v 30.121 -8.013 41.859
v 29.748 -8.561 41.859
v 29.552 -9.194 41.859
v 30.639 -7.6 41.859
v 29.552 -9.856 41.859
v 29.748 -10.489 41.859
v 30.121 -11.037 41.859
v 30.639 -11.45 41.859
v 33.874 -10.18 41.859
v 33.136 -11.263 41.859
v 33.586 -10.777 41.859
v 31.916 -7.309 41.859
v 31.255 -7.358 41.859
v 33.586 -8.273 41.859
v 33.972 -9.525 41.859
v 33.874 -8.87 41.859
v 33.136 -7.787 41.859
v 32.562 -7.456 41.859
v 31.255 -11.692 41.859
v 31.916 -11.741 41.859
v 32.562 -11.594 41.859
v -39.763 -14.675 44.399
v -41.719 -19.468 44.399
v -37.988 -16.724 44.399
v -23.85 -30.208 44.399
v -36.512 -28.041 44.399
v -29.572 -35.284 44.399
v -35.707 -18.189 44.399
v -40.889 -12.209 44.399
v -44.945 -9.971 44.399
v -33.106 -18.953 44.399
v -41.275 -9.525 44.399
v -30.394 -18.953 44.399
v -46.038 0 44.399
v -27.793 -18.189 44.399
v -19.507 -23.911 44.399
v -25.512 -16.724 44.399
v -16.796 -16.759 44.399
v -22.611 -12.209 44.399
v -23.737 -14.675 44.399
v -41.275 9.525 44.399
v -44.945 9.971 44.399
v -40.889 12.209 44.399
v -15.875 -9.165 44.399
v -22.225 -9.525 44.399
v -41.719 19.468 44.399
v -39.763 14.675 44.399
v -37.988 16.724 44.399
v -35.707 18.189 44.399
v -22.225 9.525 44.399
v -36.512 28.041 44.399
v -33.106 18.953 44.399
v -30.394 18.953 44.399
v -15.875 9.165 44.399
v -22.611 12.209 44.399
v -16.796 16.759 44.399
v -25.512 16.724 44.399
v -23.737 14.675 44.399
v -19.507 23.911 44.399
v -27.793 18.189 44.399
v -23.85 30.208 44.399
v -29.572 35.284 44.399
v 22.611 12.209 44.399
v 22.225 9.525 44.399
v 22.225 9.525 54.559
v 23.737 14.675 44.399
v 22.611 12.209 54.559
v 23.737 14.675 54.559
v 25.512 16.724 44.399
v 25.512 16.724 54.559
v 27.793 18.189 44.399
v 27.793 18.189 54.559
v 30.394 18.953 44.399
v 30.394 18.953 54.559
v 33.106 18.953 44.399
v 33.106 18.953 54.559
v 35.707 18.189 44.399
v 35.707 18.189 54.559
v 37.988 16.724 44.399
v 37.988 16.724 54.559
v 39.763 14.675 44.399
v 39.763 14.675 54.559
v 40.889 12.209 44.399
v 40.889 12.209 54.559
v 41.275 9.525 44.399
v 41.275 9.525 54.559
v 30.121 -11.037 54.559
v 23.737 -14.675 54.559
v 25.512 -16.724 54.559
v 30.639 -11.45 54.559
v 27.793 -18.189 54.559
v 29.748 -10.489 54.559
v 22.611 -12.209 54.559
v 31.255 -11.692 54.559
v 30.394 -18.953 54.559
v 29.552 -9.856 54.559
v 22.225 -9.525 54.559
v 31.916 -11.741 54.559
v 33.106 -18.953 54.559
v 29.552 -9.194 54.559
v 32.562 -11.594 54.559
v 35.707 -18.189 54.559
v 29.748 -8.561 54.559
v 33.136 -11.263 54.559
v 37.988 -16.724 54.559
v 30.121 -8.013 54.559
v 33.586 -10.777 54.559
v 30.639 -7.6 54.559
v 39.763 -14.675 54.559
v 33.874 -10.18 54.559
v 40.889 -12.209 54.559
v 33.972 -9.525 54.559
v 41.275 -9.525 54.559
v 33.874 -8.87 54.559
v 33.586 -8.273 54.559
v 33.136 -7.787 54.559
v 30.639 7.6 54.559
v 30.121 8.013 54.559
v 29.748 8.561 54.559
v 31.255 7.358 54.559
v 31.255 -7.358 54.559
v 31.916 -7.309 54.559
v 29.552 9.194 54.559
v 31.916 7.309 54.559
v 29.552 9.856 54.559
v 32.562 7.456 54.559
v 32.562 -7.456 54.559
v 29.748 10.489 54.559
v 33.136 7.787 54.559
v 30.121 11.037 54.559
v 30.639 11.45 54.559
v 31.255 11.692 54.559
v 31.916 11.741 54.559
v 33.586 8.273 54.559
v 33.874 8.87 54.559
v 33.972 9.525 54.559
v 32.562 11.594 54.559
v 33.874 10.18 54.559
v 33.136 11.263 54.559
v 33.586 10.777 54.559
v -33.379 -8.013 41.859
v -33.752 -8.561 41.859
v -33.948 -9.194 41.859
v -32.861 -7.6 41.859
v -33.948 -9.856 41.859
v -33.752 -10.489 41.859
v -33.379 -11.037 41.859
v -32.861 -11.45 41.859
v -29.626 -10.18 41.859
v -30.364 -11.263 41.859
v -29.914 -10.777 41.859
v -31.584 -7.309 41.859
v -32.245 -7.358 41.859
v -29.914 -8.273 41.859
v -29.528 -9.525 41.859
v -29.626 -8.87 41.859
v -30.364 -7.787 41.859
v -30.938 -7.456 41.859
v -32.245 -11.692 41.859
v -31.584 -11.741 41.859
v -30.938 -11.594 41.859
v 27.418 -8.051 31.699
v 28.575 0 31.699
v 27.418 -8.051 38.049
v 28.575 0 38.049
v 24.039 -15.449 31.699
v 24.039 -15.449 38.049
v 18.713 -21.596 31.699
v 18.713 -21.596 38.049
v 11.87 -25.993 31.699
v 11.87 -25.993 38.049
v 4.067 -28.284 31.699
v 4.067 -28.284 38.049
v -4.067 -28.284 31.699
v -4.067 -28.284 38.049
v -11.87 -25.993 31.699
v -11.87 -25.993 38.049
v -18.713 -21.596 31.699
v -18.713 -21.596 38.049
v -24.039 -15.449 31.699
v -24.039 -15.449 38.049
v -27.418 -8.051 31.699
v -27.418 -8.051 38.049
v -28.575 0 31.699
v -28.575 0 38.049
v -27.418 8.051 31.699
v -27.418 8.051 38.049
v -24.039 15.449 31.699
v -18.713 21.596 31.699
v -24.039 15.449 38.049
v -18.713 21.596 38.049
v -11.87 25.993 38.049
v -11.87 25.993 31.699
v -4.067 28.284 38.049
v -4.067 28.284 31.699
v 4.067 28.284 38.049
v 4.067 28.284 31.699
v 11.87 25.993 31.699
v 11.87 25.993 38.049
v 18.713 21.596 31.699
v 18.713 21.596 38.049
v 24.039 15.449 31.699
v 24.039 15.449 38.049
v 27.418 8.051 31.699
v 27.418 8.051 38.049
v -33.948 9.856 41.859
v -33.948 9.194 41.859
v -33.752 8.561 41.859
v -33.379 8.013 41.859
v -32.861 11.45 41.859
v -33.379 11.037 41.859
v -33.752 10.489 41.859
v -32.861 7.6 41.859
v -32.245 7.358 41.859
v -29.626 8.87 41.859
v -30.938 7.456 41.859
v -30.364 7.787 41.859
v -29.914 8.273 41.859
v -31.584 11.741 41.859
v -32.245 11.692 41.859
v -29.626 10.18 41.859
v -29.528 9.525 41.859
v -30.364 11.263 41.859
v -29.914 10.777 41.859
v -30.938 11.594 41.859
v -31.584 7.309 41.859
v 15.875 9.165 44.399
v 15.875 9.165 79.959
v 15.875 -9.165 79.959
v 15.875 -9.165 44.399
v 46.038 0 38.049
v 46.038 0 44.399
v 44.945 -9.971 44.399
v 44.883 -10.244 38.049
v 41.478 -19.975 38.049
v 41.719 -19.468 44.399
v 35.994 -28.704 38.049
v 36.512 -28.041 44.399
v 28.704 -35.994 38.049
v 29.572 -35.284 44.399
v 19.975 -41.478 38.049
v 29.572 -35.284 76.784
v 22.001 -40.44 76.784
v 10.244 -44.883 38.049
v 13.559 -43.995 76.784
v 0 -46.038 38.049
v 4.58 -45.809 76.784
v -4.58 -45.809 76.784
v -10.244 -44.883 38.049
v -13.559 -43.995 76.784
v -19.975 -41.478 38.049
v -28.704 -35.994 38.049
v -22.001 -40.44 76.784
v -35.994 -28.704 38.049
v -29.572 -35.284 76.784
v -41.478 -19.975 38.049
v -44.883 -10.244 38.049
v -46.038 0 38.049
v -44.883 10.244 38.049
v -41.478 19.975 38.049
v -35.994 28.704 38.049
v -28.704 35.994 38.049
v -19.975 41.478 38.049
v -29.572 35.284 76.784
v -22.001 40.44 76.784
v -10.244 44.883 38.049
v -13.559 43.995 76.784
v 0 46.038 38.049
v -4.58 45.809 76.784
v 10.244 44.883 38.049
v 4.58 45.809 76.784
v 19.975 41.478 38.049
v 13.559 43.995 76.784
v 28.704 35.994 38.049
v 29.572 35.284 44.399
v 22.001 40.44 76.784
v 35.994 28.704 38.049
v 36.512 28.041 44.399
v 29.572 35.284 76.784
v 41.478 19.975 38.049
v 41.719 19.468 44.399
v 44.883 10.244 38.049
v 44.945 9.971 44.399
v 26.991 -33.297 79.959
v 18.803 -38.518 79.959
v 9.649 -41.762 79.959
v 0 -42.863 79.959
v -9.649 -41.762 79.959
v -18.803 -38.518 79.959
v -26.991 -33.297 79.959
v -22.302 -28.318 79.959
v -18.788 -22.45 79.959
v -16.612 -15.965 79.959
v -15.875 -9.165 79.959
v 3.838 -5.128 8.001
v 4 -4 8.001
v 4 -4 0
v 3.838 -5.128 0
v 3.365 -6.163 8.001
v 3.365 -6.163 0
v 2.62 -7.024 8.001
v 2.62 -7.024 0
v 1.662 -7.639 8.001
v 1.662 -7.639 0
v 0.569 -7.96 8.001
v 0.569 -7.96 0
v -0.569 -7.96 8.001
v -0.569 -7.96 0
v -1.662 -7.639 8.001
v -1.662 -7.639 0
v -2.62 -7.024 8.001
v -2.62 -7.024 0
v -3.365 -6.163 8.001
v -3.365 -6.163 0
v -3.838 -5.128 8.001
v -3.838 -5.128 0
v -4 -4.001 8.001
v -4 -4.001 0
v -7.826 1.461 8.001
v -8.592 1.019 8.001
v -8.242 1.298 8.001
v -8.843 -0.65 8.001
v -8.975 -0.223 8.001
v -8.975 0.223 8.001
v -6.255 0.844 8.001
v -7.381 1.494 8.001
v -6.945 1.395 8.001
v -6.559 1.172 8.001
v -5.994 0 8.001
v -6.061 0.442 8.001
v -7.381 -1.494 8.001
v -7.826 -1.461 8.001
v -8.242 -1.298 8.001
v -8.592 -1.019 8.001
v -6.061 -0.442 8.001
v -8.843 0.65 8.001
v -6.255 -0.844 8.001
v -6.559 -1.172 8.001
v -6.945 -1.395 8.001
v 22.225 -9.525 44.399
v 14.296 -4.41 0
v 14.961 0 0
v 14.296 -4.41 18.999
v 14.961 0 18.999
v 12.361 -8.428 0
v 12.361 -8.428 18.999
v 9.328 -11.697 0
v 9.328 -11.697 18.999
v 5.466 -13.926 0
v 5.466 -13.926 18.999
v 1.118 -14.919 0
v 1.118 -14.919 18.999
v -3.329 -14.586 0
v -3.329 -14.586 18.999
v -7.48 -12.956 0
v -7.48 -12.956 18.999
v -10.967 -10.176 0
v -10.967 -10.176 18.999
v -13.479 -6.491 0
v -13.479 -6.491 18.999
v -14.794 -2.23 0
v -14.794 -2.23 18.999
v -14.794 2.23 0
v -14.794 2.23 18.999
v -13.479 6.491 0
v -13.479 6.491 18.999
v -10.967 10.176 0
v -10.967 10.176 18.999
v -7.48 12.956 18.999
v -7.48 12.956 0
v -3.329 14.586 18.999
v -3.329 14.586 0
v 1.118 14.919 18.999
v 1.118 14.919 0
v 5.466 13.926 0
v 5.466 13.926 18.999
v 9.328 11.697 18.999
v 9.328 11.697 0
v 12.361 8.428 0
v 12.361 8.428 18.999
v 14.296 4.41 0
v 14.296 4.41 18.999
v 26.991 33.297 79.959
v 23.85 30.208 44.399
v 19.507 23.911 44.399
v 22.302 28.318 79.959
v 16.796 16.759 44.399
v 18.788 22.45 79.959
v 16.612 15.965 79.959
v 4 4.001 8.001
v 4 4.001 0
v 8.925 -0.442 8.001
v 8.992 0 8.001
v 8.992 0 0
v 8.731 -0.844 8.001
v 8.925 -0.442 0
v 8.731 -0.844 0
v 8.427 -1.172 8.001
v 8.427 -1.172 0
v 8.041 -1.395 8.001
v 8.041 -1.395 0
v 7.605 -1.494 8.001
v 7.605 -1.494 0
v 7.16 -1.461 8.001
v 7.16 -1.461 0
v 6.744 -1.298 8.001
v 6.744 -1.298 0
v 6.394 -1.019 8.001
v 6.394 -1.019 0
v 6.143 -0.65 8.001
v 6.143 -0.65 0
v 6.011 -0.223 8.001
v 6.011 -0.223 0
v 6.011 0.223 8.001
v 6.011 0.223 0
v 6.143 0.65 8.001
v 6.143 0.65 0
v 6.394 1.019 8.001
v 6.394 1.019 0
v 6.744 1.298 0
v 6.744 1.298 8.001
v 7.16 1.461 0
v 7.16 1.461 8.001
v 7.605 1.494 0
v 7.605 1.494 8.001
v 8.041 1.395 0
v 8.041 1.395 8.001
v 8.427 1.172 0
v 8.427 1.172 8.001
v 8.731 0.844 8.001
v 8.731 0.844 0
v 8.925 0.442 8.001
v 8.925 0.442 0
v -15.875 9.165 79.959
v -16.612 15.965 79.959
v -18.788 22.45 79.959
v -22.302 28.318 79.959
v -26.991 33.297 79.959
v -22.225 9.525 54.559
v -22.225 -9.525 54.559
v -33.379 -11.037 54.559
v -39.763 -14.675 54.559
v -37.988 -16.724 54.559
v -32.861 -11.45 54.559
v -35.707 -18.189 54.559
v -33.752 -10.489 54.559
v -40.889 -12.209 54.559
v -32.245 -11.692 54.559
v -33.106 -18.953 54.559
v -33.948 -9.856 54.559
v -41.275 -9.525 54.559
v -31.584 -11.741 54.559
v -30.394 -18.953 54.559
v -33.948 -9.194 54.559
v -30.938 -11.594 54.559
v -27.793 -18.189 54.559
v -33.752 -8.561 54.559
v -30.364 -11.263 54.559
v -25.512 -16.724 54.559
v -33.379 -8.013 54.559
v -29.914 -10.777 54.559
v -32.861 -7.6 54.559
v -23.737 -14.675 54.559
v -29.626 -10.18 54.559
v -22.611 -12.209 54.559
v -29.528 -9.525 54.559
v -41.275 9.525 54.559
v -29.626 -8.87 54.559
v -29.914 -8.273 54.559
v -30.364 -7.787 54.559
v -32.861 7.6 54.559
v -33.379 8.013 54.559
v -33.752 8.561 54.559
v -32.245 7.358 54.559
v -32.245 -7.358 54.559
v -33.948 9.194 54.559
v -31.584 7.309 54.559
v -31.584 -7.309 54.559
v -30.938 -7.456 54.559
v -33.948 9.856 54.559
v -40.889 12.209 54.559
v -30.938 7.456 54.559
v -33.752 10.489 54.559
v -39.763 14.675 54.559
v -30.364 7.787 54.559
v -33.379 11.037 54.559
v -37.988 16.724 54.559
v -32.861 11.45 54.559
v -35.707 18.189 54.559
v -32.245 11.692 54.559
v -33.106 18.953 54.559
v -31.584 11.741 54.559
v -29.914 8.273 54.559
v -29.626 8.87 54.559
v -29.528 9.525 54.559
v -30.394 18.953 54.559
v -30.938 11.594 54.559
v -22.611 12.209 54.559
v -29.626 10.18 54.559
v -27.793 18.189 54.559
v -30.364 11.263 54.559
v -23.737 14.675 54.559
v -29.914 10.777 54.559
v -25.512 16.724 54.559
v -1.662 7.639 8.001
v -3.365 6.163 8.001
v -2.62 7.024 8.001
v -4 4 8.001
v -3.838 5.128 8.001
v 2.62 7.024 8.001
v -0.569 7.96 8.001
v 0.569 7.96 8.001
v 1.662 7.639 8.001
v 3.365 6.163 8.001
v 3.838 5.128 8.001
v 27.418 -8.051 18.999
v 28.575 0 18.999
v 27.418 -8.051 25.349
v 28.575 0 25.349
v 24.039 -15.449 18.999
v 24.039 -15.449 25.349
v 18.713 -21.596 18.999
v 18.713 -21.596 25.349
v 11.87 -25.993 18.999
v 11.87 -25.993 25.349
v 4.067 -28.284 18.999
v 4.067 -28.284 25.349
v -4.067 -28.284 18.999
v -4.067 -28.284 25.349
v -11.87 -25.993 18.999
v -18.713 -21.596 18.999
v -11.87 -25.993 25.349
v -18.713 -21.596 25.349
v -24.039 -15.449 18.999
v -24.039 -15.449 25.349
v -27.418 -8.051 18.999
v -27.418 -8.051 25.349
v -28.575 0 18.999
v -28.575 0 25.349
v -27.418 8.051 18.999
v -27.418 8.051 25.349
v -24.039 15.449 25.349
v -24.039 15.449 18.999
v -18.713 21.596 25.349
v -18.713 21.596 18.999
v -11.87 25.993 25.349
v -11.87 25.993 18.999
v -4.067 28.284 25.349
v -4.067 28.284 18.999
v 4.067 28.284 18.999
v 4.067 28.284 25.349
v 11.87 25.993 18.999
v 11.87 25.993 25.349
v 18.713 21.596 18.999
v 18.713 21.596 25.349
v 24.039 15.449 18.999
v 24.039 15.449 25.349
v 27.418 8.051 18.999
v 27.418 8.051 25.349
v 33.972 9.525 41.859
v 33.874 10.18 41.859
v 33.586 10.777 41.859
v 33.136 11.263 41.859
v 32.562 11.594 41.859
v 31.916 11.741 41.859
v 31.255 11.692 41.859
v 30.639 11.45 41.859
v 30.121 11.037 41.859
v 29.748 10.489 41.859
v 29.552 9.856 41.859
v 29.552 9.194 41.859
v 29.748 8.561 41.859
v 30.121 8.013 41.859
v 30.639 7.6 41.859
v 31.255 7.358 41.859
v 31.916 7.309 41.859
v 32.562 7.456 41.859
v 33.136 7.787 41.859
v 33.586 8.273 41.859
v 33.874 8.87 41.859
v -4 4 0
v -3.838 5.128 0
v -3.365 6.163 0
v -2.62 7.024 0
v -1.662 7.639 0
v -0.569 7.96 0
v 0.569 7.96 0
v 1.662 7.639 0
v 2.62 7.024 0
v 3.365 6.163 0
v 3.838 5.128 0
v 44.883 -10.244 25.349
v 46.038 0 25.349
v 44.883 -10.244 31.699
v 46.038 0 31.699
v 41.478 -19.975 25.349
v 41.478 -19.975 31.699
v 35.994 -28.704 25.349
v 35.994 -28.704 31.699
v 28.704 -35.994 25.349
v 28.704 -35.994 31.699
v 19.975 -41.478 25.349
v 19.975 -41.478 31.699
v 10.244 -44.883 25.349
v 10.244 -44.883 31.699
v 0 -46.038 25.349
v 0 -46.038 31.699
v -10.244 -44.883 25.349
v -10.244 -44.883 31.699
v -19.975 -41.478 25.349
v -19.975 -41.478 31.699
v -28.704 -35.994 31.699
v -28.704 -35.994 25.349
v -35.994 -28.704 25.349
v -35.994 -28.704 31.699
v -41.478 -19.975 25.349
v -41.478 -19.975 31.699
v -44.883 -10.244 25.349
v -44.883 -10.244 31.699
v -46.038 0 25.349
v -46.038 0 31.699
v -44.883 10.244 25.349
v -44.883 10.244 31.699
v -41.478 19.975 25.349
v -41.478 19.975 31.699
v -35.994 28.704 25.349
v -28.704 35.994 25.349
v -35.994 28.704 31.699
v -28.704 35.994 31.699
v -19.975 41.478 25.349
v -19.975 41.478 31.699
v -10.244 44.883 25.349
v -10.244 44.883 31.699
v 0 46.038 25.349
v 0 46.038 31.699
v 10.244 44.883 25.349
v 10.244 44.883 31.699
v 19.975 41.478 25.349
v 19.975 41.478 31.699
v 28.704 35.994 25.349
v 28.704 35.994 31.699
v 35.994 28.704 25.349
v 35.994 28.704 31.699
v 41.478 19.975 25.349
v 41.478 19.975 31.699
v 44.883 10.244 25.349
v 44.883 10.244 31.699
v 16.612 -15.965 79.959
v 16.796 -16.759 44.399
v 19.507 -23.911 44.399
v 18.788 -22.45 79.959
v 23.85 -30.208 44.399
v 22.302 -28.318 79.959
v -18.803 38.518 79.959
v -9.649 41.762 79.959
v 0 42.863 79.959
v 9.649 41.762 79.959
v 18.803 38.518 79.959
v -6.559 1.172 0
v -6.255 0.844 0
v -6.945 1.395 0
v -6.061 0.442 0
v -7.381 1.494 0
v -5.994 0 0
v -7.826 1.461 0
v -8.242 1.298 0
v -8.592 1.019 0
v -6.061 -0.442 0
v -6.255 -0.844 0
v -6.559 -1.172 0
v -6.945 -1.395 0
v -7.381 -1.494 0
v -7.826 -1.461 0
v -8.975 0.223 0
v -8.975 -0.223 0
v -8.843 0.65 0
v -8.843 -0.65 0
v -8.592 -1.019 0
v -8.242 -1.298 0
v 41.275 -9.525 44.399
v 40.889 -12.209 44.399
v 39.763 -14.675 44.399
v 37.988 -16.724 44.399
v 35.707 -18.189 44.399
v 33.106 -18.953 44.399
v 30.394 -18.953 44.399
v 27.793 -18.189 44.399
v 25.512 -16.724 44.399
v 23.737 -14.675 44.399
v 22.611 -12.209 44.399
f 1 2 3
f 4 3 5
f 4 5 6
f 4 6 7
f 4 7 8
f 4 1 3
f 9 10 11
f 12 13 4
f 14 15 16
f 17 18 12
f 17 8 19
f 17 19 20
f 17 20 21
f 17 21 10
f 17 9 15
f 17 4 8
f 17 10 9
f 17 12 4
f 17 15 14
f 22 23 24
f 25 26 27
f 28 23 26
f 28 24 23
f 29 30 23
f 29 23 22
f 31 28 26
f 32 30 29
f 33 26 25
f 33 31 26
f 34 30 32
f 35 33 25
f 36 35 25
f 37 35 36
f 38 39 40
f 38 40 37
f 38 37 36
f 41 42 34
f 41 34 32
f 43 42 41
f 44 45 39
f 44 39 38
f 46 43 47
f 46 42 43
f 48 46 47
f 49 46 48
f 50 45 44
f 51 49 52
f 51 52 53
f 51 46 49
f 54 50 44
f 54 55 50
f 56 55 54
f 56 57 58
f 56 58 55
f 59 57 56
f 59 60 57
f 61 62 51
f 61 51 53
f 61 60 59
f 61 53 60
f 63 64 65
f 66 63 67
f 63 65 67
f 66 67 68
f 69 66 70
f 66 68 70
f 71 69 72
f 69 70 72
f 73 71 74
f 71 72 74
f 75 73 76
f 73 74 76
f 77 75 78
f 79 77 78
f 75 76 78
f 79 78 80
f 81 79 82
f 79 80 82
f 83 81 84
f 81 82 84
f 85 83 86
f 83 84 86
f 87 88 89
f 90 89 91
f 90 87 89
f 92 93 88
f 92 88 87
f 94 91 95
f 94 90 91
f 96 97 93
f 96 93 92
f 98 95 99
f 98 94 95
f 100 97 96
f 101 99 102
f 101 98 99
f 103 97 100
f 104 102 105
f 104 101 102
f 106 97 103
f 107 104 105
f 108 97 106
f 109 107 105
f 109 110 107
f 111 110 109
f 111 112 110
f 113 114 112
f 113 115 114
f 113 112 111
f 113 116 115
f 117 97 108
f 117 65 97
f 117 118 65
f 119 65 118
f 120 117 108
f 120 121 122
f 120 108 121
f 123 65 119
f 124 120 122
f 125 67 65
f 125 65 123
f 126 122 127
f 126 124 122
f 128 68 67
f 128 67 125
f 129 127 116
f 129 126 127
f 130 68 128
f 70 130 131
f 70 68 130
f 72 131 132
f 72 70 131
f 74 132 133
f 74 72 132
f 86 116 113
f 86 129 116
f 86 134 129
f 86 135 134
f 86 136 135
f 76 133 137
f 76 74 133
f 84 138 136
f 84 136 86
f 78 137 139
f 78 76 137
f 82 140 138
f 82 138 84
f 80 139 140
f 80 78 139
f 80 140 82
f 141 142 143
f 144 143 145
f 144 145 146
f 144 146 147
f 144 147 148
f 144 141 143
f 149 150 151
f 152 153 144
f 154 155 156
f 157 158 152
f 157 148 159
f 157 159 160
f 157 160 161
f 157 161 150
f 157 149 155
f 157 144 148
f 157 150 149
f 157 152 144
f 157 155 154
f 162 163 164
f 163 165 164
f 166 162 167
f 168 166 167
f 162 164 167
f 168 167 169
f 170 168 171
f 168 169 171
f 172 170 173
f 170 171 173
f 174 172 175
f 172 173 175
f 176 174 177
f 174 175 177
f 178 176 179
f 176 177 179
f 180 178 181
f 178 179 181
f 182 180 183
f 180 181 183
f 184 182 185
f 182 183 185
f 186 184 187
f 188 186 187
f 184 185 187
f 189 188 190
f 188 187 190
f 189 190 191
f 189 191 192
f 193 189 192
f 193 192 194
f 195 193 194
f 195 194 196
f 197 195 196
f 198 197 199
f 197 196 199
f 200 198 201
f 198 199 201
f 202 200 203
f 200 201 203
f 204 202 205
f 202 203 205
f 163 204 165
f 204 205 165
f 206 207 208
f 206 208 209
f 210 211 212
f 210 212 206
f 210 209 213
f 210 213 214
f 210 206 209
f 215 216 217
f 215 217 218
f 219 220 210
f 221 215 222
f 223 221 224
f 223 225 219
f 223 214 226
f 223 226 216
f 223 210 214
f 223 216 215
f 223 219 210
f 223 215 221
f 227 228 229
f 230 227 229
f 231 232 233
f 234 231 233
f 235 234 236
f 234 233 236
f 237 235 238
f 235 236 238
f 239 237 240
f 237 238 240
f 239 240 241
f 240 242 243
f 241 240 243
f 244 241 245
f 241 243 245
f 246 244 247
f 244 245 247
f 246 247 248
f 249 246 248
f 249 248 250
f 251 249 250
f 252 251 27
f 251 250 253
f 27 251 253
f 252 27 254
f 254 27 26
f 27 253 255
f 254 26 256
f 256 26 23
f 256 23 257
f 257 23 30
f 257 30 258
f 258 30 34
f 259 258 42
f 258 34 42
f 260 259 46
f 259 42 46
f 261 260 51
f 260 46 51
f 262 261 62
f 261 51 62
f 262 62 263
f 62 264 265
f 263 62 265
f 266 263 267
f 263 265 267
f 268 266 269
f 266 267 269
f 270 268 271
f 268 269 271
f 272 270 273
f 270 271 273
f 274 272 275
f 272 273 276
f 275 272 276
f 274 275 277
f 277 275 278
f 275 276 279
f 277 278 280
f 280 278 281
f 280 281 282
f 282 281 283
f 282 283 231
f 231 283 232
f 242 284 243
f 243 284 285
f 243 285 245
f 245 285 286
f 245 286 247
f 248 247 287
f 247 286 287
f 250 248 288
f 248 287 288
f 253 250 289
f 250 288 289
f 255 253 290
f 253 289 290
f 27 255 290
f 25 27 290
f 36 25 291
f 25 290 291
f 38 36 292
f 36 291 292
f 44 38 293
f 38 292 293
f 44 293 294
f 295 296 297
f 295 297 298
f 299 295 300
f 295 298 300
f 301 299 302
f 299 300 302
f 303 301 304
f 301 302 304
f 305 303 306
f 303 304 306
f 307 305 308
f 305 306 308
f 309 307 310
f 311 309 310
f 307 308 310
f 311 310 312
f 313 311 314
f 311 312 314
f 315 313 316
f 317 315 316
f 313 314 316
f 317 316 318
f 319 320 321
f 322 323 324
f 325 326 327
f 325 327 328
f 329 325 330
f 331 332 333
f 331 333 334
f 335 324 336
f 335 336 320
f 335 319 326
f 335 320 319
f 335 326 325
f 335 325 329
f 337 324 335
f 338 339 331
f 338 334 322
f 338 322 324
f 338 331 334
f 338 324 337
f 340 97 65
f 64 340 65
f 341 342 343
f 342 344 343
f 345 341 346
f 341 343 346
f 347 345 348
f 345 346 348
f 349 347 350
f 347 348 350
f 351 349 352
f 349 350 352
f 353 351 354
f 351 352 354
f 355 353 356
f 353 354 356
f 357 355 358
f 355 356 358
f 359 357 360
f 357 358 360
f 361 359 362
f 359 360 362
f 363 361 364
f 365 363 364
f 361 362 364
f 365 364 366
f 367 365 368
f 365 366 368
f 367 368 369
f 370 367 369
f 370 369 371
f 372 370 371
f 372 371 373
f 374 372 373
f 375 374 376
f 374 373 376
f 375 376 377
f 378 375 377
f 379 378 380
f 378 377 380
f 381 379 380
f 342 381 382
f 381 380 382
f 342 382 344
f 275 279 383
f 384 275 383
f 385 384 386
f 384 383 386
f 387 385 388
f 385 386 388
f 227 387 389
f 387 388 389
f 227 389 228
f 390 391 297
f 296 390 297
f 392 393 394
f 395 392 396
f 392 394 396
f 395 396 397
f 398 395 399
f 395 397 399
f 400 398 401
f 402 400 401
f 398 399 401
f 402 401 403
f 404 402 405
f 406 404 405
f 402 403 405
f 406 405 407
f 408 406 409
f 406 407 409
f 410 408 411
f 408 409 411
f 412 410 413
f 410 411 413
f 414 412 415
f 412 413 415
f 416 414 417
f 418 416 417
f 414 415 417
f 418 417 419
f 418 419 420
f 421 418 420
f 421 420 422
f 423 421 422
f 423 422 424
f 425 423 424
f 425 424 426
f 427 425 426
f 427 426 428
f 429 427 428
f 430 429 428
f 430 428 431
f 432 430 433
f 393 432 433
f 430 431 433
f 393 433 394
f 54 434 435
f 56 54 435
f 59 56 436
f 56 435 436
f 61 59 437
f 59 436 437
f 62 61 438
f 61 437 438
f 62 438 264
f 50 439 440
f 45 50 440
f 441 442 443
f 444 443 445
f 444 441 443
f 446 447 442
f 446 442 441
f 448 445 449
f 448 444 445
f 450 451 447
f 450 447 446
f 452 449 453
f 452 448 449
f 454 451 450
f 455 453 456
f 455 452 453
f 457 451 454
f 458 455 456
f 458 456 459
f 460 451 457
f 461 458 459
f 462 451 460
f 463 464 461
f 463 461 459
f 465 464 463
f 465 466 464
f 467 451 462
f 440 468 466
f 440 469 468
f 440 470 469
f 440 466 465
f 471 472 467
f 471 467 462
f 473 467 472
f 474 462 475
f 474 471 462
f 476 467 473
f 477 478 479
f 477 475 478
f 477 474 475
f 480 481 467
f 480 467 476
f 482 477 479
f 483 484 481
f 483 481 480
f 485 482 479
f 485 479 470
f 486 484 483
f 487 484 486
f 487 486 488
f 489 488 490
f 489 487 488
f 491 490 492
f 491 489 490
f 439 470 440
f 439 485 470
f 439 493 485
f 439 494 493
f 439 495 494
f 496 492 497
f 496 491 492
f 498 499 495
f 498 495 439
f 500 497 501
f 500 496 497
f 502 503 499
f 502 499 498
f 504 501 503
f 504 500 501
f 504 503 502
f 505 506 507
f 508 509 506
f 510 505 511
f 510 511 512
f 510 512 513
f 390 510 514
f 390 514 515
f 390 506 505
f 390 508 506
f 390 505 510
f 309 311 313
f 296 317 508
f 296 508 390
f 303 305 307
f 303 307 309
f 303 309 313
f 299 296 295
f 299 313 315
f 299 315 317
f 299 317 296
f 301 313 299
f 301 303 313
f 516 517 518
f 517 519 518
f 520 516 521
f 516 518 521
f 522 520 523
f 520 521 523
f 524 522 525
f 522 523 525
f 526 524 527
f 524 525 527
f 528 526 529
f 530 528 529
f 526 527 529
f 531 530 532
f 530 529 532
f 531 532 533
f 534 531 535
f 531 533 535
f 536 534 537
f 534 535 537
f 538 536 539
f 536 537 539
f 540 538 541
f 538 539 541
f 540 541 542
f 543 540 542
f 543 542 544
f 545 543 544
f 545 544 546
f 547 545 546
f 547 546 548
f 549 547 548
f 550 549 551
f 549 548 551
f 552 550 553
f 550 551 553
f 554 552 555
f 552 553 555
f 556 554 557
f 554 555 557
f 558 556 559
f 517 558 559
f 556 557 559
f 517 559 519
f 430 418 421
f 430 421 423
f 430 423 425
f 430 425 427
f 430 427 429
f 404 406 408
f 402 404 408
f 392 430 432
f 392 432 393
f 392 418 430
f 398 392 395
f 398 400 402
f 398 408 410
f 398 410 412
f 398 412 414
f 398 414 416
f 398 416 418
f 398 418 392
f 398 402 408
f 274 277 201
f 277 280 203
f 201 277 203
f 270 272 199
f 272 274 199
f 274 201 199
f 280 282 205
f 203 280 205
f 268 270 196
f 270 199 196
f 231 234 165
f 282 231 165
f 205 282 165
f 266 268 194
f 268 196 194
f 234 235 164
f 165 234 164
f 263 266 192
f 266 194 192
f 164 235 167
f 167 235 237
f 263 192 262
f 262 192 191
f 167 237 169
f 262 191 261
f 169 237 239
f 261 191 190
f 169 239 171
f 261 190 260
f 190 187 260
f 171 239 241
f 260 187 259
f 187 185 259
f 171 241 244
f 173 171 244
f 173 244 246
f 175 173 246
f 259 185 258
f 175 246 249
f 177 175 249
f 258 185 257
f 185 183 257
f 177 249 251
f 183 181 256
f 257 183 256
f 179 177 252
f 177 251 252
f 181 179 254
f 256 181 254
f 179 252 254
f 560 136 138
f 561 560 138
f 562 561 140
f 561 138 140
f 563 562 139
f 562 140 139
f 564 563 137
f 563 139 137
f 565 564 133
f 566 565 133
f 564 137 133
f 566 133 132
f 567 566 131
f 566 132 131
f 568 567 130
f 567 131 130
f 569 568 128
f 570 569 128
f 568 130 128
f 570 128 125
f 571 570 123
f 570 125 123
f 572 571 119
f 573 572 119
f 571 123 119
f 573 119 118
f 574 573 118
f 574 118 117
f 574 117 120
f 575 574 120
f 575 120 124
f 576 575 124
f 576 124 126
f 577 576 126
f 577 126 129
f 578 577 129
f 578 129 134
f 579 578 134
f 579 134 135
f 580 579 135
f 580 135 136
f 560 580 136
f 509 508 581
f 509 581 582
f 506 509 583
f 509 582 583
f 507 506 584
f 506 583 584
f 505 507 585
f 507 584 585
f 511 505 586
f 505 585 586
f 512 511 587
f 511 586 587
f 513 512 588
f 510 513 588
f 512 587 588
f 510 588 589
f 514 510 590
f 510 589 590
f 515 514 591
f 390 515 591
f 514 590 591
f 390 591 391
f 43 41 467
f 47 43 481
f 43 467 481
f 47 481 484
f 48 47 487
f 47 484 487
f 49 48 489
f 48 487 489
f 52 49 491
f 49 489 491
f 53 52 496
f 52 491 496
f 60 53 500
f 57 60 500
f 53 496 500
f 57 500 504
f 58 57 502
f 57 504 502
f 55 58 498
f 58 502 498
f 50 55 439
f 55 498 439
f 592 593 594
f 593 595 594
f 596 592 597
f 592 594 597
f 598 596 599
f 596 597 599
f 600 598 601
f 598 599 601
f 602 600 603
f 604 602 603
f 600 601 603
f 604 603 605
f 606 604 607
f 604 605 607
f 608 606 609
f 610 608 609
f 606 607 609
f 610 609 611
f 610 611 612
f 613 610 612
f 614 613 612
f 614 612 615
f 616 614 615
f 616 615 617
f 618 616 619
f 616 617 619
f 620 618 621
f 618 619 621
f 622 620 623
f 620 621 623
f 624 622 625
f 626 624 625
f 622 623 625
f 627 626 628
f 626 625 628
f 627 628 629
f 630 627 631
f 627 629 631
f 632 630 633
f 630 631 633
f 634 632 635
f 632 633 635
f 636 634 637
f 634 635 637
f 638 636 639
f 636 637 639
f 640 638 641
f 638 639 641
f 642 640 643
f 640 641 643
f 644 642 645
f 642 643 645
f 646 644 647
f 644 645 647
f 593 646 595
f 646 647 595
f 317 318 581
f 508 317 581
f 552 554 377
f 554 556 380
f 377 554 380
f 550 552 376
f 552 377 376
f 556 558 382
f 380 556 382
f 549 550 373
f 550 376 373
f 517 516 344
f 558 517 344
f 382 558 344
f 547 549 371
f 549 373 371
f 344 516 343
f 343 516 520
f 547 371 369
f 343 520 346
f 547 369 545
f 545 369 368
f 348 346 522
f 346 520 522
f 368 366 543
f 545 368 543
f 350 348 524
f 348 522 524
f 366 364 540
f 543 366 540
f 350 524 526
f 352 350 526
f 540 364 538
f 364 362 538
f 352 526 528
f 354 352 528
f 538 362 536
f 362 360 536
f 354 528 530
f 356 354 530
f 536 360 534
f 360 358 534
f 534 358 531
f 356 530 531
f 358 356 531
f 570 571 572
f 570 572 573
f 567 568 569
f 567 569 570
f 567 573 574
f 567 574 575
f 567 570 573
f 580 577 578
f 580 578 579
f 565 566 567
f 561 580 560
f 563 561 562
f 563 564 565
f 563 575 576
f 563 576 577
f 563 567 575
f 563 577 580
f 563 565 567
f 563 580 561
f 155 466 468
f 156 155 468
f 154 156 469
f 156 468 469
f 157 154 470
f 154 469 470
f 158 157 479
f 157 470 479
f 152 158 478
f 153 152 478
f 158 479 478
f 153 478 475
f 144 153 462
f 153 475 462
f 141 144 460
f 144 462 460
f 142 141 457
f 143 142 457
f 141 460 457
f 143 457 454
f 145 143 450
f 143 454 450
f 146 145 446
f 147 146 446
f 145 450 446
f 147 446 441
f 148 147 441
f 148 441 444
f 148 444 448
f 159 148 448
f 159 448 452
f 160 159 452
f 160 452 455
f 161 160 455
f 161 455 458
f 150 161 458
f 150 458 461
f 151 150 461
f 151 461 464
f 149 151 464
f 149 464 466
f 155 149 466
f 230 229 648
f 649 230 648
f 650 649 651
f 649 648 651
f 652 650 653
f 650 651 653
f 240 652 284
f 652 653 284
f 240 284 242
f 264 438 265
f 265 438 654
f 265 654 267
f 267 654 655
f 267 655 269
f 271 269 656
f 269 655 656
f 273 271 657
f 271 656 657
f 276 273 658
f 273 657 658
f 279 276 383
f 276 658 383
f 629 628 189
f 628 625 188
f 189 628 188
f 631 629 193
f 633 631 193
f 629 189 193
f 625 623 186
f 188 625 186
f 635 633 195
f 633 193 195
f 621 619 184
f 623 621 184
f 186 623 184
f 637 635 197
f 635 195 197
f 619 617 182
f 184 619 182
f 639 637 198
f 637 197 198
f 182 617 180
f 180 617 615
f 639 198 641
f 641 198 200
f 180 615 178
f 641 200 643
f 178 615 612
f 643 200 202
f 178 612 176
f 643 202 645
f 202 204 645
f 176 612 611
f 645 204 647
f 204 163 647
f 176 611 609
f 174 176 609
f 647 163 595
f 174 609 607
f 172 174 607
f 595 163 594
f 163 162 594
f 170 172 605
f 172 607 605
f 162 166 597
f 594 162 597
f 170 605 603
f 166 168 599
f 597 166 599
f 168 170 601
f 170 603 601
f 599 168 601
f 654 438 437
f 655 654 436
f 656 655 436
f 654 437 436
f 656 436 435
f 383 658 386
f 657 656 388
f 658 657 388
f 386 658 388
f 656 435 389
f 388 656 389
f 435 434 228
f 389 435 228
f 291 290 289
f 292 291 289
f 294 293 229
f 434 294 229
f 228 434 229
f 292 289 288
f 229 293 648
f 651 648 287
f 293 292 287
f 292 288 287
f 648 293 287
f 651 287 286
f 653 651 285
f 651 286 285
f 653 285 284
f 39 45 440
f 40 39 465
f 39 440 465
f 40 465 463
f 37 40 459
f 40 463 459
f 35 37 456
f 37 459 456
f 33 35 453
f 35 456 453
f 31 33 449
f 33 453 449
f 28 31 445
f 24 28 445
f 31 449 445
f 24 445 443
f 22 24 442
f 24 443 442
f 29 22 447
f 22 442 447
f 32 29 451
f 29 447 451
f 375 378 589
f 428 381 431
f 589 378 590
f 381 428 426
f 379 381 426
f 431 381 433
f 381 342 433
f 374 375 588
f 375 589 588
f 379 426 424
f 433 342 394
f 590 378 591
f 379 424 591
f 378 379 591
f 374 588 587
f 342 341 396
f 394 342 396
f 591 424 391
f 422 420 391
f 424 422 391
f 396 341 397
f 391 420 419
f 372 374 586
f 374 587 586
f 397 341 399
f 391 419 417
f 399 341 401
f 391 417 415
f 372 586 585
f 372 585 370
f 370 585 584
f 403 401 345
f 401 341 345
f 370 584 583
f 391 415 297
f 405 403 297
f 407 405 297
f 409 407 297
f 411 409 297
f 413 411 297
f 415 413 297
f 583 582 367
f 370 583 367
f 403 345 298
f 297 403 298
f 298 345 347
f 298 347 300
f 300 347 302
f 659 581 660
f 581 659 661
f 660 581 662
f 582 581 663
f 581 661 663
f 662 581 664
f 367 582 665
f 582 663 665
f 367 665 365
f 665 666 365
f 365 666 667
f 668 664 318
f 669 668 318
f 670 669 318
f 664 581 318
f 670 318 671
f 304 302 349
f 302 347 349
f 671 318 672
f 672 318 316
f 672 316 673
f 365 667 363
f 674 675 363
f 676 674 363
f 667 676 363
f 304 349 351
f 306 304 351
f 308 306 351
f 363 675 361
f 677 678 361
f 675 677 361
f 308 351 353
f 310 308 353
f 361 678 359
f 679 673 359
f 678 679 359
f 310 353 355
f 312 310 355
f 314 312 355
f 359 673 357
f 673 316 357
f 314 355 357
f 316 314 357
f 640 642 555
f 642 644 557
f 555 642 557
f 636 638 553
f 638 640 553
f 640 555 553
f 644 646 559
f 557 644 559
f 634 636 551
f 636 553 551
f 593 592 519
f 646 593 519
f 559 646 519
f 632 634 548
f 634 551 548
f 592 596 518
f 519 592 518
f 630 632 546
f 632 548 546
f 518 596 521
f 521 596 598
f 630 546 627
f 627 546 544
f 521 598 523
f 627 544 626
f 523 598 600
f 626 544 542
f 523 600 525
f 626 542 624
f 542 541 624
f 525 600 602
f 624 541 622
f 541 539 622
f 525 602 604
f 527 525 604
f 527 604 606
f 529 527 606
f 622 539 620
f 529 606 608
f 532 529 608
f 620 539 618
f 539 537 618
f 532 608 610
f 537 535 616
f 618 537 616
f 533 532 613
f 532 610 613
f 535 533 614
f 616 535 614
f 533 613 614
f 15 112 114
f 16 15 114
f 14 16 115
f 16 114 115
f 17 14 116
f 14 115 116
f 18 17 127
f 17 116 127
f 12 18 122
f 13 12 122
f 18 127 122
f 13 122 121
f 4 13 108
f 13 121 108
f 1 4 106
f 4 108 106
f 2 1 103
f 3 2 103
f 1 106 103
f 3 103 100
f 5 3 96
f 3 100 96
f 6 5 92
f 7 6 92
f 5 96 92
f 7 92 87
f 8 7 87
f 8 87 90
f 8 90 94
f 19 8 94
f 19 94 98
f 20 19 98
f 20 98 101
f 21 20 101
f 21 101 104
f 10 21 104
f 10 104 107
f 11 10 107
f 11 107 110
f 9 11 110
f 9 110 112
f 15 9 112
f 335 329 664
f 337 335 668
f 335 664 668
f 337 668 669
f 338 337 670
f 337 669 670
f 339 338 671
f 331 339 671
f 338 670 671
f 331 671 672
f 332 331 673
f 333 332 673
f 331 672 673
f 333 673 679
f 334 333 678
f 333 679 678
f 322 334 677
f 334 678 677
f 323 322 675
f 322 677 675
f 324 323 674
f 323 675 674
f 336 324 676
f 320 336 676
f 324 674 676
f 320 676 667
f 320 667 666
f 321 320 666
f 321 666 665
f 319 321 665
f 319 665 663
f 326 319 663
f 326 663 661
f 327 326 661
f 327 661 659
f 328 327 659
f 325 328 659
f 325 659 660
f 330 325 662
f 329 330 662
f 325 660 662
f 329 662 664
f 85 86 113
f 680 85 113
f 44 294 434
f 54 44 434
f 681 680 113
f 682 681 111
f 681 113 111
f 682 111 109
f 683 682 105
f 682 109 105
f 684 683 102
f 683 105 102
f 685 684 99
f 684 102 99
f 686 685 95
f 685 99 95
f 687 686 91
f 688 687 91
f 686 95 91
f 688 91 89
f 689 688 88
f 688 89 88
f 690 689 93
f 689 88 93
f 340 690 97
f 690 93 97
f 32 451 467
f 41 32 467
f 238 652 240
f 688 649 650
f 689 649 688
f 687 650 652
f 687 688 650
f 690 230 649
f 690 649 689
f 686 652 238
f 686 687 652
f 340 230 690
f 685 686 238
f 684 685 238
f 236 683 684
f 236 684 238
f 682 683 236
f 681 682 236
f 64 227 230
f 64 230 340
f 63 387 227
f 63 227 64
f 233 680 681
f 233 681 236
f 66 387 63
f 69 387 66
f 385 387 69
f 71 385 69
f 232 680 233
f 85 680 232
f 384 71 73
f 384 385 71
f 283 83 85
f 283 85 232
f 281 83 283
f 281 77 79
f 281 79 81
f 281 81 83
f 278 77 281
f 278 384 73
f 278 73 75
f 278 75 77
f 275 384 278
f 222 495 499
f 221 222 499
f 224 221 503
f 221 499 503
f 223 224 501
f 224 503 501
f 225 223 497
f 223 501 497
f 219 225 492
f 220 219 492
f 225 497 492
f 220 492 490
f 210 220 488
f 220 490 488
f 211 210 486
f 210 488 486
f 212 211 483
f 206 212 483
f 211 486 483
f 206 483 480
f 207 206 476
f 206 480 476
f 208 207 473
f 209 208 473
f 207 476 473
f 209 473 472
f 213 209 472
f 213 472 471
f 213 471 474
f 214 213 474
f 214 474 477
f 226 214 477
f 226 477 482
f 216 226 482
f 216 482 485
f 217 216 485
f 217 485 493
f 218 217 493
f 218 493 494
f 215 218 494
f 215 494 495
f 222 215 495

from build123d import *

# Parameters (mm, degrees)
F2_R     = 2.2225
F3_DEPTH = 25.4
F4_DEPTH = 35.56
F5_DEPTH = 38.1
F6_SIZE  = 3.175
F7_R     = 1.4986
F8_DEPTH = 8.001


with BuildPart() as f1:
    # F0 (on Front) → F1 (revolve)
    with BuildSketch(Plane.XZ):
        Polygon((0, 0), (14.9606, 0), (14.9606, 18.9992), (28.575, 18.9992), (28.575, 25.3492), (46.0375, 25.3492), (46.0375, 31.6992), (28.575, 31.6992), (28.575, 38.0492), (46.0375, 38.0492), (46.0375, 44.3992), (46.0375, 50.7492), (46.0375, 79.9592), (0, 79.9592), align=None)
    revolve(axis=Axis((0, 0, 39.9796), (0, 0, -1)))

    # F2 (on face) → F3 (cut)
    with BuildSketch(Plane.XY.offset(79.9592)):
        with BuildLine():
            Line((41.275, -9.525), (41.275, 9.525))
            ThreePointArc((41.275, 9.525), (31.75, 19.05), (22.225, 9.525))
            Line((22.225, 9.525), (22.225, -9.525))
            ThreePointArc((22.225, -9.525), (31.75, -19.05), (41.275, -9.525))
        make_face()
        with Locations((31.75, -9.525)):
            Circle(F2_R, mode=Mode.SUBTRACT)
        with Locations((31.75, 9.525)):
            Circle(F2_R, mode=Mode.SUBTRACT)
        with BuildLine():
            Line((-41.275, 9.525), (-41.275, -9.525))
            ThreePointArc((-41.275, -9.525), (-31.75, -19.05), (-22.225, -9.525))
            Line((-22.225, -9.525), (-22.225, 9.525))
            ThreePointArc((-22.225, 9.525), (-31.75, 19.05), (-41.275, 9.525))
        make_face()
        with Locations((-31.75, -9.525)):
            Circle(F2_R, mode=Mode.SUBTRACT)
        with Locations((-31.75, 9.525)):
            Circle(F2_R, mode=Mode.SUBTRACT)
    extrude(amount=-F3_DEPTH, mode=Mode.SUBTRACT)

    # F2 (on face) → F4 (cut)
    with BuildSketch(Plane.XY.offset(79.9592)):
        with BuildLine():
            Line((15.875, 9.1654355234), (15.875, -9.1654355234))
            ThreePointArc((15.875, -9.1654355234), (19.507052962, -23.9114029169), (29.5722317713, -35.2836295513))
            ThreePointArc((29.5722317713, -35.2836295513), (41.7185991281, -19.4681764179), (46.0375, 0))
            ThreePointArc((46.0375, 0), (41.7185991281, 19.4681764179), (29.5722317713, 35.2836295513))
            ThreePointArc((29.5722317713, 35.2836295513), (19.507052962, 23.9114029169), (15.875, 9.1654355234))
        make_face()
        with BuildLine():
            ThreePointArc((22.225, 9.525), (31.75, 19.05), (41.275, 9.525))
            Line((41.275, 9.525), (41.275, -9.525))
            ThreePointArc((41.275, -9.525), (31.75, -19.05), (22.225, -9.525))
            Line((22.225, -9.525), (22.225, 9.525))
        make_face(mode=Mode.SUBTRACT)
        with BuildLine():
            ThreePointArc((-15.875, 9.1654355234), (-19.507052962, 23.9114029169), (-29.5722317713, 35.2836295513))
            ThreePointArc((-29.5722317713, 35.2836295513), (-46.0375, 0), (-29.5722317713, -35.2836295513))
            ThreePointArc((-29.5722317713, -35.2836295513), (-19.507052962, -23.9114029169), (-15.875, -9.1654355234))
            Line((-15.875, -9.1654355234), (-15.875, 9.1654355234))
        make_face()
        with BuildLine():
            ThreePointArc((-22.225, -9.525), (-31.75, -19.05), (-41.275, -9.525))
            Line((-41.275, -9.525), (-41.275, 9.525))
            ThreePointArc((-41.275, 9.525), (-31.75, 19.05), (-22.225, 9.525))
            Line((-22.225, 9.525), (-22.225, -9.525))
        make_face(mode=Mode.SUBTRACT)
    extrude(amount=-F4_DEPTH, mode=Mode.SUBTRACT)

    # F2 (on face) → F5 (cut)
    with BuildSketch(Plane.XY.offset(79.9592)):
        with Locations((-31.75, 9.525)):
            Circle(F2_R)
        with Locations((-31.75, -9.525)):
            Circle(F2_R)
        with Locations((31.75, 9.525)):
            Circle(F2_R)
        with Locations((31.75, -9.525)):
            Circle(F2_R)
    extrude(amount=-F5_DEPTH, mode=Mode.SUBTRACT)

    # F6
    f6_edges = [f1.edges().sort_by_distance(p)[0] for p in [
        (0, -46.0375, 79.9592),
        (0, 46.0375, 79.9592),
    ]]
    chamfer(f6_edges, length=F6_SIZE)

    # F7 (on face) → F8 (cut)
    with BuildSketch(Plane(origin=(0, 0, 0), x_dir=(1, 0, 0), z_dir=(0, 0, -1))):
        with BuildLine():
            Line((4.0005, -4.0005), (4.0005, 4.0005))
            ThreePointArc((4.0005, 4.0005), (0, 8.001), (-4.0005, 4.0005))
            Line((-4.0005, 4.0005), (-4.0005, -4.0005))
            ThreePointArc((-4.0005, -4.0005), (0, -8.001), (4.0005, -4.0005))
        make_face()
        with Locations((-7.493, 0)):
            Circle(F7_R)
        with Locations((7.493, 0)):
            Circle(F7_R)
    extrude(amount=-F8_DEPTH, mode=Mode.SUBTRACT)


solid = f1.part
